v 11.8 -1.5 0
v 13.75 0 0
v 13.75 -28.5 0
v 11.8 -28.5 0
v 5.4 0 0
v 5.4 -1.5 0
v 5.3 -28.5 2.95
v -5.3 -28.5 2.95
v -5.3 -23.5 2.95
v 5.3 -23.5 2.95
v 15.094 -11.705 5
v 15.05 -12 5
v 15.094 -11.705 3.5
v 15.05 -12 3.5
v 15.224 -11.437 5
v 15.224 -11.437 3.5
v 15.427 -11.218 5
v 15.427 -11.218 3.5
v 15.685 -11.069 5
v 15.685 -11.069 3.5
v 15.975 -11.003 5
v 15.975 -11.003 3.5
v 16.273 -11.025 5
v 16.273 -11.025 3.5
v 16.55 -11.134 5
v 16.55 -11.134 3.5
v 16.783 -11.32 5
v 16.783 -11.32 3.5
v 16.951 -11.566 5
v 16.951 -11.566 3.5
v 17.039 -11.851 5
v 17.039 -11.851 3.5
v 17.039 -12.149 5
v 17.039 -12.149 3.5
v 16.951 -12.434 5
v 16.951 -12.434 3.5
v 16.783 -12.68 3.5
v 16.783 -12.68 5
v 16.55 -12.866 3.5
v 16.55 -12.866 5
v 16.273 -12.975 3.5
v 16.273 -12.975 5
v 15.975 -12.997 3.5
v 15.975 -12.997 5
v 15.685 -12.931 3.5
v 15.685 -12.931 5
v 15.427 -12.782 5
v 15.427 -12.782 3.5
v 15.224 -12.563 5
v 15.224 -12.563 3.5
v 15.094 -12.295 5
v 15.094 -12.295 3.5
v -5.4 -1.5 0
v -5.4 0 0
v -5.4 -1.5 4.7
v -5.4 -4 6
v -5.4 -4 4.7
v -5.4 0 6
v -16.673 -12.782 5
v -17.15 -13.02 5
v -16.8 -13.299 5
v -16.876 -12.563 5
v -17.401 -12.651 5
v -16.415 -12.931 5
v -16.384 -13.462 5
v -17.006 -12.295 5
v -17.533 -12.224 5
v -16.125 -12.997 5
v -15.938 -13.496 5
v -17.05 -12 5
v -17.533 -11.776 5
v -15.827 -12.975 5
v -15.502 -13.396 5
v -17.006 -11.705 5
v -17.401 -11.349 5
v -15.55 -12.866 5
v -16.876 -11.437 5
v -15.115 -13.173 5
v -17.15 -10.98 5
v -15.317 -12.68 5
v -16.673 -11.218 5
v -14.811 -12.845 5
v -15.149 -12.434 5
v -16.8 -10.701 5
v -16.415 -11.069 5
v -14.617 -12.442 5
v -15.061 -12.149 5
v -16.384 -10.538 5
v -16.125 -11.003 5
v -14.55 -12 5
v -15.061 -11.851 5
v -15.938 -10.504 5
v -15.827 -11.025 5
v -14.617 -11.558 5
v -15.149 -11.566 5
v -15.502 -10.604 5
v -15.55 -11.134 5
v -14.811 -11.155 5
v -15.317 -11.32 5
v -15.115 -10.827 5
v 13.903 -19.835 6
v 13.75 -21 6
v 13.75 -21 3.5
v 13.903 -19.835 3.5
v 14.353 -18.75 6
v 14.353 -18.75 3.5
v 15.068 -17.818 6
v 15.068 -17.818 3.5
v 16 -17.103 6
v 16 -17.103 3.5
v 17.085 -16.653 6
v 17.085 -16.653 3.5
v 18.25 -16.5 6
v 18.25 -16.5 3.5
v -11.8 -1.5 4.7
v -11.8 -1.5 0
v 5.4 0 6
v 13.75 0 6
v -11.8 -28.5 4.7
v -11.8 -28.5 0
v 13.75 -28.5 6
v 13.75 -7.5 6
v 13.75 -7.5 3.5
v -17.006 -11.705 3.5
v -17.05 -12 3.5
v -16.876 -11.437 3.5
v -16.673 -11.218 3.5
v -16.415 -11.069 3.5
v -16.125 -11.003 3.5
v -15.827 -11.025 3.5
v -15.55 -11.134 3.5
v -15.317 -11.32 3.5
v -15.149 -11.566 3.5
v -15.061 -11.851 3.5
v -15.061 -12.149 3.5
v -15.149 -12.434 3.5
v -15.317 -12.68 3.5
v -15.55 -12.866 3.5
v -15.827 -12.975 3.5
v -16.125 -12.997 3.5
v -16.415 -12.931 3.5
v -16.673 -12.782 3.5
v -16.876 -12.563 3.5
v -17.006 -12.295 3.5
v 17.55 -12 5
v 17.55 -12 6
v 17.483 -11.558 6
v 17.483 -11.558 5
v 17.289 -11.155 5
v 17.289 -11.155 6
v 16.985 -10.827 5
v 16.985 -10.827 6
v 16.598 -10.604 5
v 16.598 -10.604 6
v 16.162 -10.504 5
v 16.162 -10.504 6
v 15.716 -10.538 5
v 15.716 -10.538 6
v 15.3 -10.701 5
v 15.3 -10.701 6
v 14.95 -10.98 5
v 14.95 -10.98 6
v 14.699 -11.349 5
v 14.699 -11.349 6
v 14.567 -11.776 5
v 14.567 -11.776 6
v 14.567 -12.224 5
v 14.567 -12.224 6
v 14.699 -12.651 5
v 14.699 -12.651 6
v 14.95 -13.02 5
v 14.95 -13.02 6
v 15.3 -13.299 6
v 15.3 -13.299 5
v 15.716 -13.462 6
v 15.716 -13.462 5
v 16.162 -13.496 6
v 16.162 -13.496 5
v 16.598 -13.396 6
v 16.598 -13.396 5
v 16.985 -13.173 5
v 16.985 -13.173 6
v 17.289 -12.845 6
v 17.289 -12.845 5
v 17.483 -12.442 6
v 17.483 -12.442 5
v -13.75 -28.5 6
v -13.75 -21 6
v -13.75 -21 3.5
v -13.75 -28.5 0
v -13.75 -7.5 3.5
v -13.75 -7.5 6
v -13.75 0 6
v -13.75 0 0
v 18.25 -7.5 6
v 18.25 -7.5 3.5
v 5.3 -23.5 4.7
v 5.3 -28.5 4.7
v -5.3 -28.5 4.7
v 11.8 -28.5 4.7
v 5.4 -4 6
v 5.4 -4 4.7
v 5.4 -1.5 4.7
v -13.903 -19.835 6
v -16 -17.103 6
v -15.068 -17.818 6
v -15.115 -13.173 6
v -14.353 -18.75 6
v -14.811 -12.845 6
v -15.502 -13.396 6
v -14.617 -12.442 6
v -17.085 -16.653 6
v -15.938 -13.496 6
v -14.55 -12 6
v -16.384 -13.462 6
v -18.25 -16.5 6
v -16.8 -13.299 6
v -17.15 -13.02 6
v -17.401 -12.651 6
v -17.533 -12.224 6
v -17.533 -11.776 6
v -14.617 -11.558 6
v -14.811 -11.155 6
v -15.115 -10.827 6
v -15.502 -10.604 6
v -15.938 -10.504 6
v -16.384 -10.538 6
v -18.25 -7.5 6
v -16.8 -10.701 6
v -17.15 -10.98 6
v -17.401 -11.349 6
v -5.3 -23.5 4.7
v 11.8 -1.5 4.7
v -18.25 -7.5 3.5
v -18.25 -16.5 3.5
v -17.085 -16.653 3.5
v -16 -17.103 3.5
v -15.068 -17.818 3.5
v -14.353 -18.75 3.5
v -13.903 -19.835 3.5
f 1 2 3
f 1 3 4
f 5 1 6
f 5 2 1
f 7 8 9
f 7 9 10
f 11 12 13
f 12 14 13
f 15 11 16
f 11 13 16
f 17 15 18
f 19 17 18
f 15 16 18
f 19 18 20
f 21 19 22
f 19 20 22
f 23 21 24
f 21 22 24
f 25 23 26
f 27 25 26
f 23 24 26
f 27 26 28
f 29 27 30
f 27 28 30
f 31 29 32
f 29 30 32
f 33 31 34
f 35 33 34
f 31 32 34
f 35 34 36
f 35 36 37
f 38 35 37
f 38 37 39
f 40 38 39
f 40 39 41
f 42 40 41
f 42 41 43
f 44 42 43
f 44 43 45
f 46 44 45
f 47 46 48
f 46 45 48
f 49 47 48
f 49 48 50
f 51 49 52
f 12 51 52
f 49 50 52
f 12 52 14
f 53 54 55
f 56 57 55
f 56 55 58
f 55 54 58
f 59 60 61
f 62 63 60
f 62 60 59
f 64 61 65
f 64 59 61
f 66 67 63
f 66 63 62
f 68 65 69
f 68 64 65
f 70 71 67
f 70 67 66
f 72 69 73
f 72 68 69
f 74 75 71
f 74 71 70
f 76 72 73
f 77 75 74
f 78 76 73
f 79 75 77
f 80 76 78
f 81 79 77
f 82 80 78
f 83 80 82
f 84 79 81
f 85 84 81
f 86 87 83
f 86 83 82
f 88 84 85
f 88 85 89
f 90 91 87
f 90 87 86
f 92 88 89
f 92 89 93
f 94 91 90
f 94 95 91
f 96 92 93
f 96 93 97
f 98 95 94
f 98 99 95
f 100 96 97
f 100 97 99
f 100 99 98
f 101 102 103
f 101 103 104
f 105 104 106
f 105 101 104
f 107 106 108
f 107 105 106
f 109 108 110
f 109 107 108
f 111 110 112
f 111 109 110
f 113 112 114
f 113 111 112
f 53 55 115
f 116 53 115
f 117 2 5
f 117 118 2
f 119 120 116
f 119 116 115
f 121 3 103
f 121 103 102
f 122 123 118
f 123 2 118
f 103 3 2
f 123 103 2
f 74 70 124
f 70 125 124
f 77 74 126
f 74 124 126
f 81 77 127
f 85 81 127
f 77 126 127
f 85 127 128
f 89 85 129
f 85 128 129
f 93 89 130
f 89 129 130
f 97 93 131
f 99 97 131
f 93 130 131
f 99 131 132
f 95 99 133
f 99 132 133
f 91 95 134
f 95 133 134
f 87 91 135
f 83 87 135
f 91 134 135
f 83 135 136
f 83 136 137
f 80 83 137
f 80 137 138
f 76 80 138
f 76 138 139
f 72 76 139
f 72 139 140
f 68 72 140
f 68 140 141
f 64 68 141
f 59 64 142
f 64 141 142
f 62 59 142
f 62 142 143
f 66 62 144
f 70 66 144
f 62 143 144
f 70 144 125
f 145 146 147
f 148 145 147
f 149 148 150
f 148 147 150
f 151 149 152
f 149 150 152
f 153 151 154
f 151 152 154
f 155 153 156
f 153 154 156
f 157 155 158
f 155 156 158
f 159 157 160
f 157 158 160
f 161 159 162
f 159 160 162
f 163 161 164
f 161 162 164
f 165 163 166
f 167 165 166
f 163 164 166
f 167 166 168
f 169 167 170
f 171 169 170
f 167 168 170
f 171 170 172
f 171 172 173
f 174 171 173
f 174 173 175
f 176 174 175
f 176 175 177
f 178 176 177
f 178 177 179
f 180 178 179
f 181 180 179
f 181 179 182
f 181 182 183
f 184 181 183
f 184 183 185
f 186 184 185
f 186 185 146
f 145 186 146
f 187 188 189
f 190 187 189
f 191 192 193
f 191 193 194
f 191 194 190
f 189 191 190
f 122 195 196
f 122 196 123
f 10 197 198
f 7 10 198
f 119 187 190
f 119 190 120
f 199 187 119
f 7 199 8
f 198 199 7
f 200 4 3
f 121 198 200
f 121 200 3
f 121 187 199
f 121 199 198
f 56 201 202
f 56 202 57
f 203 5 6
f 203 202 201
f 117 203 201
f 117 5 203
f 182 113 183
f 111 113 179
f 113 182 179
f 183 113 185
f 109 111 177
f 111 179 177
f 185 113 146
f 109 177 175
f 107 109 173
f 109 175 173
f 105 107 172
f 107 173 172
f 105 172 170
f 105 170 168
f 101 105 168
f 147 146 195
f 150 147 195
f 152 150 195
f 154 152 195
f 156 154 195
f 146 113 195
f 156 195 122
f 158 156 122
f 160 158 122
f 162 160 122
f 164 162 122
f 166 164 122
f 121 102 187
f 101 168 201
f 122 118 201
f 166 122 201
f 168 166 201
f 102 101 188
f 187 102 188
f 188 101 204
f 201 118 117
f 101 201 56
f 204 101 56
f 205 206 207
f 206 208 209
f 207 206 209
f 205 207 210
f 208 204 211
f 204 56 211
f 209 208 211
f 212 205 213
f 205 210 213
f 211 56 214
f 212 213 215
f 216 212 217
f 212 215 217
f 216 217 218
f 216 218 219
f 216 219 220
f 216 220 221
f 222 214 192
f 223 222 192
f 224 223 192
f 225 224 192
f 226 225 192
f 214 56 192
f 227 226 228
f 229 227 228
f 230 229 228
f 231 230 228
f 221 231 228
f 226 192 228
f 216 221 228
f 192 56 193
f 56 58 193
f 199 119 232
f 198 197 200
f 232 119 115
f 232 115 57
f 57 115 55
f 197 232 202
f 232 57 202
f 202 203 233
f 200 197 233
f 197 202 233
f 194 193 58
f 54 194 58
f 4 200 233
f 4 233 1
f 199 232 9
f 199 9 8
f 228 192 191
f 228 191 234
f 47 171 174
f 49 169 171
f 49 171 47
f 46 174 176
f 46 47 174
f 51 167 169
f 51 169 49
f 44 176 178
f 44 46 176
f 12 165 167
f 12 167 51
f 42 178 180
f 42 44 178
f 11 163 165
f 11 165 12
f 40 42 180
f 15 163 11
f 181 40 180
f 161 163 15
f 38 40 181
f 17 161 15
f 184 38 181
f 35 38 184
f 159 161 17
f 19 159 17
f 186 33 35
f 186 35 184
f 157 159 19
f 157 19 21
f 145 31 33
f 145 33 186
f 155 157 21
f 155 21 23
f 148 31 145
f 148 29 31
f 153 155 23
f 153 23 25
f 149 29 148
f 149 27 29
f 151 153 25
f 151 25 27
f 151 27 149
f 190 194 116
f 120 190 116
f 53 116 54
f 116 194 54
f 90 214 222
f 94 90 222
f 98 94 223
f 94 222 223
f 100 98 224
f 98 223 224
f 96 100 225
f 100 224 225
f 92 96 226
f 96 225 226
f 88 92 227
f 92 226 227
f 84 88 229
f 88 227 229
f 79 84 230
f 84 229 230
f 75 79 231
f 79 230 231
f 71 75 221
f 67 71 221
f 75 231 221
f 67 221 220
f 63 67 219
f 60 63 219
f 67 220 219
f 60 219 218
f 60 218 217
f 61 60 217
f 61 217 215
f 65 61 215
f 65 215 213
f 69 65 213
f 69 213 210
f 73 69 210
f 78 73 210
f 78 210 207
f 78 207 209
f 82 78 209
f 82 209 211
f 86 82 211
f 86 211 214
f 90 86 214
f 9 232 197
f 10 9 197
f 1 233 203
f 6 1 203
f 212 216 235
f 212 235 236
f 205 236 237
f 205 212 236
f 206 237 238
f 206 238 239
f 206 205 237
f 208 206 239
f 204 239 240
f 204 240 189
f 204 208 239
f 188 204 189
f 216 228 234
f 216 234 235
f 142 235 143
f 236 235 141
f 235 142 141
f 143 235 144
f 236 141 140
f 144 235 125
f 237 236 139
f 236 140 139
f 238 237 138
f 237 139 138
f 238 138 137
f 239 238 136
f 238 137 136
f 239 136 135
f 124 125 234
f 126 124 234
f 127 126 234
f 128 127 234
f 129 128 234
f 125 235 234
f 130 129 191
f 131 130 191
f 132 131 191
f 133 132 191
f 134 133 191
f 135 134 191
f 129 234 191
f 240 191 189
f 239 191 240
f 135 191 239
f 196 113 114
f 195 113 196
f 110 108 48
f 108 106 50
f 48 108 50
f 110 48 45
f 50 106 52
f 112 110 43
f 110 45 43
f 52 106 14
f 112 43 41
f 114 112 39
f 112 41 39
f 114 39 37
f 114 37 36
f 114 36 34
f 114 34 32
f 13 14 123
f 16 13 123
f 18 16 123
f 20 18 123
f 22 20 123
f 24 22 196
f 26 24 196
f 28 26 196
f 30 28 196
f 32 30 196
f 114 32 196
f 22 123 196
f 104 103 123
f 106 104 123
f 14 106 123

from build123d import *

# Parameters (mm, degrees)
F1_DEPTH       = 28.5
F5_DEPTH       = 2.5
F6_D           = 2
F6_CBORE_D     = 3
F6_CBORE_DEPTH = 1
F7_DEPTH       = 4
F8_W           = 10.6
F8_H           = 5
F9_DEPTH       = 1.75
F3_W           = 6.4
F3_H           = 4.7
F10_DEPTH      = 1.5


# Not quite as in the source:
# - ends of sketch curves that miss each other by under 0.0002 mm in the source are joined


with BuildPart() as f1:
    # F0 (on Front) → F1 (new body)
    with BuildSketch(Plane.XZ):
        Polygon((13.75, 6), (-13.75, 6), (-13.75, 0), (-11.8, 0), (-11.8, 4.7), (11.8, 4.7), (11.8, 0), (13.75, 0), align=None)
    extrude(amount=F1_DEPTH)

    # F4 (on face) → F5 (join)
    with BuildSketch(Plane.XY.offset(6)):
        with BuildLine():
            Line((-13.75, -7.4999997169), (-18.25, -7.4999997169))
            Line((-18.25, -7.4999997169), (-18.25, -16.4999997169))
            ThreePointArc((-18.25, -16.4999997169), (-15.0680194847, -17.8180192015), (-13.75, -20.9999997169))
            Line((-13.75, -20.9999997169), (-13.75, -7.4999997169))
        make_face()
        with BuildLine():
            Line((18.25, -7.4999999106), (13.75, -7.4999999106))
            Line((13.75, -7.4999999106), (13.75, -21))
            ThreePointArc((13.75, -21), (15.0680194847, -17.8180192015), (18.25, -16.4999997169))
            Line((18.25, -16.4999997169), (18.25, -7.4999999106))
        make_face()
    extrude(amount=-F5_DEPTH)

    # F6 (through all)
    with Locations(Plane.XY.offset(6)):
        with Locations((-16.05, -11.9999998212), (16.05, -11.9999998212)):
            CounterBoreHole(F6_D / 2, F6_CBORE_D / 2, F6_CBORE_DEPTH)

    # F3 (on face) → F7 (cut)
    with BuildSketch(Plane(origin=(0, 0, 0), x_dir=(-1, 0, 0), z_dir=(0, 1, 0))):
        Polygon((-5.4, 4.7), (-5.4, 0), (0, 0), (5.4, 0), (5.4, 4.7), (5.4, 6), (-5.4, 6), align=None)
    extrude(amount=-F7_DEPTH, mode=Mode.SUBTRACT)

    # F8 (on face) → F9 (join)
    with BuildSketch(Plane(origin=(0, 0, 4.7), x_dir=(1, 0, 0), z_dir=(0, 0, -1))):
        with Locations((0, 26)):
            Rectangle(F8_W, F8_H)
    extrude(amount=F9_DEPTH)

    # F3 (on face) → F10 (join)
    with BuildSketch(Plane(origin=(0, 0, 0), x_dir=(-1, 0, 0), z_dir=(0, 1, 0))):
        with Locations((-8.6, 2.35)):
            Rectangle(F3_W, F3_H)
        with Locations((8.6, 2.35)):
            Rectangle(F3_W, F3_H)
    extrude(amount=-F10_DEPTH)


solid = f1.part
